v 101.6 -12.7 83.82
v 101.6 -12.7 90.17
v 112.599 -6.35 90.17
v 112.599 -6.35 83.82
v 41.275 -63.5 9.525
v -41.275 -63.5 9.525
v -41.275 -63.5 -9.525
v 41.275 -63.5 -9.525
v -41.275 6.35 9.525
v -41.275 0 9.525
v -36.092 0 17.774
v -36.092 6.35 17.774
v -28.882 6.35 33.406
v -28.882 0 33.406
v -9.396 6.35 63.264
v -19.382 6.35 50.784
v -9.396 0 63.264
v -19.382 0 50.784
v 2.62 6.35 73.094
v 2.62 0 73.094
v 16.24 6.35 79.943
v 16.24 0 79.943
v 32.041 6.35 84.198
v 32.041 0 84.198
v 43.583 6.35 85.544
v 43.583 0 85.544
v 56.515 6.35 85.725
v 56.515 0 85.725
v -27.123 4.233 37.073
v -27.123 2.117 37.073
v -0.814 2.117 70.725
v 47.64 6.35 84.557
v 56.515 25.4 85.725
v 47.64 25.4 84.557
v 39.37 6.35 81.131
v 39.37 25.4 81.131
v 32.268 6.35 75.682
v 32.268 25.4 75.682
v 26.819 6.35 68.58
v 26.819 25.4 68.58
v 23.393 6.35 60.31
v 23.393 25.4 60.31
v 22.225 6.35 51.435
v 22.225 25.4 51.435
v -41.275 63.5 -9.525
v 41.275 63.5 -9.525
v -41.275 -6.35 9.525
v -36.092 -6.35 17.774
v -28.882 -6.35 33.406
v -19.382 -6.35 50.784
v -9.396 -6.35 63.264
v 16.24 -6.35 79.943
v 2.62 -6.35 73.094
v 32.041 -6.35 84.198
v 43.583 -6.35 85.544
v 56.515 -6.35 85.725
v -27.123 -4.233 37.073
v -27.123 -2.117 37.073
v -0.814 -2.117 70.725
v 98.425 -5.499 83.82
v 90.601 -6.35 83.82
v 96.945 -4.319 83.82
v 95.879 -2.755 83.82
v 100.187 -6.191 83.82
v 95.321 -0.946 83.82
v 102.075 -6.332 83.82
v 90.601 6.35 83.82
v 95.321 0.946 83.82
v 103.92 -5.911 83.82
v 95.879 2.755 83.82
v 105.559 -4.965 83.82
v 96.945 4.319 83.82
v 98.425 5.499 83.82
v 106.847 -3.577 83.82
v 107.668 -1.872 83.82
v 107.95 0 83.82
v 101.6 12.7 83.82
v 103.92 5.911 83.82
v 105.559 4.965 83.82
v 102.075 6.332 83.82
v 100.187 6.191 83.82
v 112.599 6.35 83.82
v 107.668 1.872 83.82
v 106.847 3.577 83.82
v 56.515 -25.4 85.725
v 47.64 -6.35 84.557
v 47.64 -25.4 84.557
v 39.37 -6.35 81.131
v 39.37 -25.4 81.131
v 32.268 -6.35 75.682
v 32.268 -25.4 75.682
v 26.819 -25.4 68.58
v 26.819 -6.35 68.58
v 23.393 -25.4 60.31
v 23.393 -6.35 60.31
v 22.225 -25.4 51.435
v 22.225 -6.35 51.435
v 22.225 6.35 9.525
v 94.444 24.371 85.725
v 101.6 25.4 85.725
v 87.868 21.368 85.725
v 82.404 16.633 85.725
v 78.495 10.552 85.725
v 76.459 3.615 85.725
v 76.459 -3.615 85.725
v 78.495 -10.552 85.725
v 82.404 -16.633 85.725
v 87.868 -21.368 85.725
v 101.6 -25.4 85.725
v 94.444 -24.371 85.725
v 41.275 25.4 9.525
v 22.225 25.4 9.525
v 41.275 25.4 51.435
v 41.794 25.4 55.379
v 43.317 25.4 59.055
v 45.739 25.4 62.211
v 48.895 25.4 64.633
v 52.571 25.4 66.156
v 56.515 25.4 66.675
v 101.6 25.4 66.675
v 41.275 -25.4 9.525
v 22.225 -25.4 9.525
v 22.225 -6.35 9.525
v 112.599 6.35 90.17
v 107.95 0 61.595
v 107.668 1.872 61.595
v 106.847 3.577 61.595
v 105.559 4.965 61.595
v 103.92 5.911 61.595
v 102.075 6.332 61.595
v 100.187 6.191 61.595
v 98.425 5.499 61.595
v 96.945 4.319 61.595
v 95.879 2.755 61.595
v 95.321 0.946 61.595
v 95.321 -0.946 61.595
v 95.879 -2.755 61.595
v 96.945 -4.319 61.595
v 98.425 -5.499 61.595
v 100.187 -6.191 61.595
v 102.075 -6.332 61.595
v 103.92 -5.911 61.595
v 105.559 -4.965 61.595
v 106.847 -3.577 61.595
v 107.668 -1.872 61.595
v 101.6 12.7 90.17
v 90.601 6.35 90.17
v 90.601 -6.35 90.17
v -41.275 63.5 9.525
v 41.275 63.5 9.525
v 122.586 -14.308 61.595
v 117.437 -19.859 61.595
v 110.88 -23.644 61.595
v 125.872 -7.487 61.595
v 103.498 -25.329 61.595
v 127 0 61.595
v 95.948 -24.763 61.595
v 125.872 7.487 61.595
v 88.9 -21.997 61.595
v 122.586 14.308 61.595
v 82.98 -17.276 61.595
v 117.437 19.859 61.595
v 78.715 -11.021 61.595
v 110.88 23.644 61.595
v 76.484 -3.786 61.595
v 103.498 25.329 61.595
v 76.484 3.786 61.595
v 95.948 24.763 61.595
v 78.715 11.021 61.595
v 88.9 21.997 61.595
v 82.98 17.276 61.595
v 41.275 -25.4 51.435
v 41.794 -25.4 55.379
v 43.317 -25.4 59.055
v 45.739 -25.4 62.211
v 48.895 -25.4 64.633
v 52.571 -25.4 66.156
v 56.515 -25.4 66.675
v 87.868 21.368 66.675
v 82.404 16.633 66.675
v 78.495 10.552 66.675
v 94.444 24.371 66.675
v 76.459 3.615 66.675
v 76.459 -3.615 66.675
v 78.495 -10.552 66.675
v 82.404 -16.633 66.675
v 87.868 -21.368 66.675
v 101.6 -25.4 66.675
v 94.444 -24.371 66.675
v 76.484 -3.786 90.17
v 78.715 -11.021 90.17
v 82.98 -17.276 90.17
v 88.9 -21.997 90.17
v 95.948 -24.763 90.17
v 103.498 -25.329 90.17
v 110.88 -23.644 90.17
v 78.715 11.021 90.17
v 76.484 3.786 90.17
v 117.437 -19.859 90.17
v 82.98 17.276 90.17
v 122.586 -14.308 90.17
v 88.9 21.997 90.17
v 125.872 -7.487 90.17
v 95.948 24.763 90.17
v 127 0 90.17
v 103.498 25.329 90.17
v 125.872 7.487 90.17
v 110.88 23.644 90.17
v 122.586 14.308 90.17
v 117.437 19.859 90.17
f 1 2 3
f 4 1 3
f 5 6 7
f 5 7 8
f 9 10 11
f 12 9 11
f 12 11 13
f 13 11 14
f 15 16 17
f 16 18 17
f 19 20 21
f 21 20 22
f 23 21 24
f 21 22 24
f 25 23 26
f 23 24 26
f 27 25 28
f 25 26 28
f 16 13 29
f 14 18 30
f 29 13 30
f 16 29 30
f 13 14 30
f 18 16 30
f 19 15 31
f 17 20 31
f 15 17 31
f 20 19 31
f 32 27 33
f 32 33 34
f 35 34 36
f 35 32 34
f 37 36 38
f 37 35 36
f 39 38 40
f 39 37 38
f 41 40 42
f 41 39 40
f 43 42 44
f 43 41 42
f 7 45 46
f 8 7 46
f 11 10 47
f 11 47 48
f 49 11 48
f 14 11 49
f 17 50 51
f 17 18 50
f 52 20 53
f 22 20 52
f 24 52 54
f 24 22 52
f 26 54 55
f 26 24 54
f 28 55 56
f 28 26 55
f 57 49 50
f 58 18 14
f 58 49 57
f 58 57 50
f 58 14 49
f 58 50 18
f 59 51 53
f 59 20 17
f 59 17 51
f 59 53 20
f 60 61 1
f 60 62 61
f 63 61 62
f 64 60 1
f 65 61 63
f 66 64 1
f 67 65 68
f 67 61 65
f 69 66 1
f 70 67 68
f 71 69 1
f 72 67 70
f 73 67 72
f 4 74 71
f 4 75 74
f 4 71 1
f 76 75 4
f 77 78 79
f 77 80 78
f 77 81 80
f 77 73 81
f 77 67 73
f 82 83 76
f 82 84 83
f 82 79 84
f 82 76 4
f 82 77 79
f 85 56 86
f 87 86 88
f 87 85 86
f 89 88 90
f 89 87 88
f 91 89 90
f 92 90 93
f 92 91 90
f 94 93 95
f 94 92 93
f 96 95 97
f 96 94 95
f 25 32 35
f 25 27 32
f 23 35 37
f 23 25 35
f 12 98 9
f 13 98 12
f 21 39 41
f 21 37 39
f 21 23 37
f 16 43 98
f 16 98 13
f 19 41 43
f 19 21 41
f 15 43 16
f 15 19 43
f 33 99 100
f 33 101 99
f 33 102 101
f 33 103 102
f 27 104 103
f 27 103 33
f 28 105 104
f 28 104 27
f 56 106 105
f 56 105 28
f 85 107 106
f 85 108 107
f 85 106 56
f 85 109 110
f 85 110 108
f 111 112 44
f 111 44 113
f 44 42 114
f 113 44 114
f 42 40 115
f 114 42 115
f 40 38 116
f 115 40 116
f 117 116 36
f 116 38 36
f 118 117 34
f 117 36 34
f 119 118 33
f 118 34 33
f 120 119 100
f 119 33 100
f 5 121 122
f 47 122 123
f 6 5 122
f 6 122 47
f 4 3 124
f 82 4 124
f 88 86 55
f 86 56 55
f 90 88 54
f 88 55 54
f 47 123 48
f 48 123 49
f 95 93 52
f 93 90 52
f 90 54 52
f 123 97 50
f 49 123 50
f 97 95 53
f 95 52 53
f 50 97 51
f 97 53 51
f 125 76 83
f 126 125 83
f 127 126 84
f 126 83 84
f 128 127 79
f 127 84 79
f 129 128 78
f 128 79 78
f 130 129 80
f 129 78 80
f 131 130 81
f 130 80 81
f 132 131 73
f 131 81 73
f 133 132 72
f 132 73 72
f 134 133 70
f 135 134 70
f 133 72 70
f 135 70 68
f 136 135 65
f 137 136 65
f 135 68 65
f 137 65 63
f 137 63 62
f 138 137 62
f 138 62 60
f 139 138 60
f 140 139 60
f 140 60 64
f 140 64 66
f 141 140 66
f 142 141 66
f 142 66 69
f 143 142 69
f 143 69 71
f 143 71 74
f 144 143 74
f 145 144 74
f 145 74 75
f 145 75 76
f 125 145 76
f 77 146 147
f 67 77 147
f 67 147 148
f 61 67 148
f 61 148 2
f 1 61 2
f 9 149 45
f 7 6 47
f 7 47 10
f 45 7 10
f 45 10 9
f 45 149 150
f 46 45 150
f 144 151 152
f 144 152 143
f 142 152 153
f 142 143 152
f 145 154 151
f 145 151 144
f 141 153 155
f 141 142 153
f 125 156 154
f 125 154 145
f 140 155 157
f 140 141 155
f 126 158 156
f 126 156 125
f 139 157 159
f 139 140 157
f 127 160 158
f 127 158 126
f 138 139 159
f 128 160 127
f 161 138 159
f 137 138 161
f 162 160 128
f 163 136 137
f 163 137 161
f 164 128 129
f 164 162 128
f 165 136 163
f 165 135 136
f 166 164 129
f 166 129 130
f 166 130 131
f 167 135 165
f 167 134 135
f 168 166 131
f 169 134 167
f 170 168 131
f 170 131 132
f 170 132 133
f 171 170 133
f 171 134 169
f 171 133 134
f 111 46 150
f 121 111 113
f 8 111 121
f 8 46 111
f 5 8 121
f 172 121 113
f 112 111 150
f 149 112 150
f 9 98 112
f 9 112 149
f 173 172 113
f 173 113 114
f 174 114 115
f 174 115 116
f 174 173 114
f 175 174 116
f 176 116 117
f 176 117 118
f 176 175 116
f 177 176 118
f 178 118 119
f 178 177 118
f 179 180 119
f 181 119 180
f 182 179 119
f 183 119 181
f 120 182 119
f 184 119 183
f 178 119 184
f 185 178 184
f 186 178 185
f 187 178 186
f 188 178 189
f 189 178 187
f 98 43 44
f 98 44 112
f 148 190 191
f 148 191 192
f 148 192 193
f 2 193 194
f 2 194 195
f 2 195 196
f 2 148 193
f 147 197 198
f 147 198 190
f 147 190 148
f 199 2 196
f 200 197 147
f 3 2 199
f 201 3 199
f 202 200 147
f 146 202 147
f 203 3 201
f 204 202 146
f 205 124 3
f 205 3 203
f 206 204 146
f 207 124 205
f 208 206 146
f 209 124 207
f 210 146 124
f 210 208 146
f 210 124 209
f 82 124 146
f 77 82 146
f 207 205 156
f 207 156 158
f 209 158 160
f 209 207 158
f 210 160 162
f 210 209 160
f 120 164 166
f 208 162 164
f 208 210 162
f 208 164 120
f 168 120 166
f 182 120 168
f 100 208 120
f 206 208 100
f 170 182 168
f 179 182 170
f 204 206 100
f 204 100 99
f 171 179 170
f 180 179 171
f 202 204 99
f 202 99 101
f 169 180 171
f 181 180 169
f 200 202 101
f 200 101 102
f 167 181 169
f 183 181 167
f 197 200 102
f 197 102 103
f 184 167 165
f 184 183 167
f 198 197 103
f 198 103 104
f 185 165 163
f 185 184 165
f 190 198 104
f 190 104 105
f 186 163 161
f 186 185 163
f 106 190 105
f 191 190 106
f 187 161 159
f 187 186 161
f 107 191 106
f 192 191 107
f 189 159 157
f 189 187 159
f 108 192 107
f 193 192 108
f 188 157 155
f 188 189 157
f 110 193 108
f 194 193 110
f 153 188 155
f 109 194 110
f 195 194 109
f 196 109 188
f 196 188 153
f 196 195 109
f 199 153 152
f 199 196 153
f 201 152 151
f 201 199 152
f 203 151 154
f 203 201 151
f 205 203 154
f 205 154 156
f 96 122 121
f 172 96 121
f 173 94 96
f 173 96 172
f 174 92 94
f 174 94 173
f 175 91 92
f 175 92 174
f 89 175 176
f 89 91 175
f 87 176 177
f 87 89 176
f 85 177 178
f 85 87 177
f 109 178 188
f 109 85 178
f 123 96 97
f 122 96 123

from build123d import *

# Parameters (mm, degrees)
F1_DEPTH = 63.5
F0_W     = 25.4
F0_H     = 19.05
F2_DEPTH = 25.4
F3_DEPTH = 6.35
F5_R     = 6.35
F6_DEPTH = 99.696
F7_DEPTH = 6.35


with BuildPart() as f1:
    # F0 (on Front) → F1 (new body, symmetric)
    with BuildSketch(Plane.XZ):
        Polygon((22.225, 9.525), (-41.275, 9.525), (-41.275, -9.525), (41.275, -9.525), (41.275, 9.525), align=None)
    extrude(amount=F1_DEPTH, both=True)

    # F0 (on Front) → F2 (join, symmetric)
    with BuildSketch(Plane.XZ):
        with BuildLine():
            Line((22.225, 51.435), (22.225, 9.525))
            Line((22.225, 9.525), (41.275, 9.525))
            Line((41.275, 9.525), (41.275, 51.435))
            ThreePointArc((41.275, 51.435), (45.7386926547, 62.2113073453), (56.515, 66.675))
            Line((56.515, 66.675), (76.2, 66.675))
            Line((76.2, 66.675), (76.2, 85.725))
            Line((76.2, 85.725), (56.515, 85.725))
            ThreePointArc((56.515, 85.725), (32.2683084731, 75.6816915269), (22.225, 51.435))
        make_face()
        with Locations((88.9, 76.2)):
            Rectangle(F0_W, F0_H)
    extrude(amount=F2_DEPTH, both=True)

    # F0 (on Front) → F3 (join, symmetric)
    with BuildSketch(Plane.XZ):
        with BuildLine():
            add(Edge.make_bspline(
                [(-41.275, 9.525), (-26.9147008657, 25.7702898234), (-22.6109270006, 88.3015841246), (56.515, 85.725)],
                knots=[0, 0, 0, 0, 123.9730781259, 123.9730781259, 123.9730781259, 123.9730781259], degree=3))
            Line((-41.275, 9.525), (22.225, 9.525))
            Line((22.225, 9.525), (22.225, 51.435))
            ThreePointArc((22.225, 51.435), (32.2683084731, 75.6816915269), (56.515, 85.725))
        make_face()
    extrude(amount=F3_DEPTH, both=True)

    # F0 (on Front) → F4 (revolve)
    with BuildSketch(Plane.XZ):
        Polygon((101.6, 90.17), (101.6, 85.725), (101.6, 66.675), (101.6, 61.595), (127, 61.595), (127, 90.17), align=None)
    revolve(axis=Axis((101.6, 0, 75.8825), (0, 0, 1)))

    # F5 (on face) → F6 (cut, through all)
    with BuildSketch(Plane.XY.offset(90.17)):
        with Locations((101.6, 0)):
            Circle(F5_R)
    extrude(amount=-F6_DEPTH, mode=Mode.SUBTRACT)

    # F5 (on face) → F7 (cut)
    with BuildSketch(Plane.XY.offset(90.17)):
        Polygon((112.5985226281, 6.35), (101.6, 12.7), (90.6014773719, 6.35), (90.6014773719, -6.35), (101.6, -12.7), (112.5985226281, -6.35), align=None)
        with Locations((101.6, 0)):
            Circle(F5_R, mode=Mode.SUBTRACT)
    extrude(amount=-F7_DEPTH, mode=Mode.SUBTRACT)


solid = f1.part
